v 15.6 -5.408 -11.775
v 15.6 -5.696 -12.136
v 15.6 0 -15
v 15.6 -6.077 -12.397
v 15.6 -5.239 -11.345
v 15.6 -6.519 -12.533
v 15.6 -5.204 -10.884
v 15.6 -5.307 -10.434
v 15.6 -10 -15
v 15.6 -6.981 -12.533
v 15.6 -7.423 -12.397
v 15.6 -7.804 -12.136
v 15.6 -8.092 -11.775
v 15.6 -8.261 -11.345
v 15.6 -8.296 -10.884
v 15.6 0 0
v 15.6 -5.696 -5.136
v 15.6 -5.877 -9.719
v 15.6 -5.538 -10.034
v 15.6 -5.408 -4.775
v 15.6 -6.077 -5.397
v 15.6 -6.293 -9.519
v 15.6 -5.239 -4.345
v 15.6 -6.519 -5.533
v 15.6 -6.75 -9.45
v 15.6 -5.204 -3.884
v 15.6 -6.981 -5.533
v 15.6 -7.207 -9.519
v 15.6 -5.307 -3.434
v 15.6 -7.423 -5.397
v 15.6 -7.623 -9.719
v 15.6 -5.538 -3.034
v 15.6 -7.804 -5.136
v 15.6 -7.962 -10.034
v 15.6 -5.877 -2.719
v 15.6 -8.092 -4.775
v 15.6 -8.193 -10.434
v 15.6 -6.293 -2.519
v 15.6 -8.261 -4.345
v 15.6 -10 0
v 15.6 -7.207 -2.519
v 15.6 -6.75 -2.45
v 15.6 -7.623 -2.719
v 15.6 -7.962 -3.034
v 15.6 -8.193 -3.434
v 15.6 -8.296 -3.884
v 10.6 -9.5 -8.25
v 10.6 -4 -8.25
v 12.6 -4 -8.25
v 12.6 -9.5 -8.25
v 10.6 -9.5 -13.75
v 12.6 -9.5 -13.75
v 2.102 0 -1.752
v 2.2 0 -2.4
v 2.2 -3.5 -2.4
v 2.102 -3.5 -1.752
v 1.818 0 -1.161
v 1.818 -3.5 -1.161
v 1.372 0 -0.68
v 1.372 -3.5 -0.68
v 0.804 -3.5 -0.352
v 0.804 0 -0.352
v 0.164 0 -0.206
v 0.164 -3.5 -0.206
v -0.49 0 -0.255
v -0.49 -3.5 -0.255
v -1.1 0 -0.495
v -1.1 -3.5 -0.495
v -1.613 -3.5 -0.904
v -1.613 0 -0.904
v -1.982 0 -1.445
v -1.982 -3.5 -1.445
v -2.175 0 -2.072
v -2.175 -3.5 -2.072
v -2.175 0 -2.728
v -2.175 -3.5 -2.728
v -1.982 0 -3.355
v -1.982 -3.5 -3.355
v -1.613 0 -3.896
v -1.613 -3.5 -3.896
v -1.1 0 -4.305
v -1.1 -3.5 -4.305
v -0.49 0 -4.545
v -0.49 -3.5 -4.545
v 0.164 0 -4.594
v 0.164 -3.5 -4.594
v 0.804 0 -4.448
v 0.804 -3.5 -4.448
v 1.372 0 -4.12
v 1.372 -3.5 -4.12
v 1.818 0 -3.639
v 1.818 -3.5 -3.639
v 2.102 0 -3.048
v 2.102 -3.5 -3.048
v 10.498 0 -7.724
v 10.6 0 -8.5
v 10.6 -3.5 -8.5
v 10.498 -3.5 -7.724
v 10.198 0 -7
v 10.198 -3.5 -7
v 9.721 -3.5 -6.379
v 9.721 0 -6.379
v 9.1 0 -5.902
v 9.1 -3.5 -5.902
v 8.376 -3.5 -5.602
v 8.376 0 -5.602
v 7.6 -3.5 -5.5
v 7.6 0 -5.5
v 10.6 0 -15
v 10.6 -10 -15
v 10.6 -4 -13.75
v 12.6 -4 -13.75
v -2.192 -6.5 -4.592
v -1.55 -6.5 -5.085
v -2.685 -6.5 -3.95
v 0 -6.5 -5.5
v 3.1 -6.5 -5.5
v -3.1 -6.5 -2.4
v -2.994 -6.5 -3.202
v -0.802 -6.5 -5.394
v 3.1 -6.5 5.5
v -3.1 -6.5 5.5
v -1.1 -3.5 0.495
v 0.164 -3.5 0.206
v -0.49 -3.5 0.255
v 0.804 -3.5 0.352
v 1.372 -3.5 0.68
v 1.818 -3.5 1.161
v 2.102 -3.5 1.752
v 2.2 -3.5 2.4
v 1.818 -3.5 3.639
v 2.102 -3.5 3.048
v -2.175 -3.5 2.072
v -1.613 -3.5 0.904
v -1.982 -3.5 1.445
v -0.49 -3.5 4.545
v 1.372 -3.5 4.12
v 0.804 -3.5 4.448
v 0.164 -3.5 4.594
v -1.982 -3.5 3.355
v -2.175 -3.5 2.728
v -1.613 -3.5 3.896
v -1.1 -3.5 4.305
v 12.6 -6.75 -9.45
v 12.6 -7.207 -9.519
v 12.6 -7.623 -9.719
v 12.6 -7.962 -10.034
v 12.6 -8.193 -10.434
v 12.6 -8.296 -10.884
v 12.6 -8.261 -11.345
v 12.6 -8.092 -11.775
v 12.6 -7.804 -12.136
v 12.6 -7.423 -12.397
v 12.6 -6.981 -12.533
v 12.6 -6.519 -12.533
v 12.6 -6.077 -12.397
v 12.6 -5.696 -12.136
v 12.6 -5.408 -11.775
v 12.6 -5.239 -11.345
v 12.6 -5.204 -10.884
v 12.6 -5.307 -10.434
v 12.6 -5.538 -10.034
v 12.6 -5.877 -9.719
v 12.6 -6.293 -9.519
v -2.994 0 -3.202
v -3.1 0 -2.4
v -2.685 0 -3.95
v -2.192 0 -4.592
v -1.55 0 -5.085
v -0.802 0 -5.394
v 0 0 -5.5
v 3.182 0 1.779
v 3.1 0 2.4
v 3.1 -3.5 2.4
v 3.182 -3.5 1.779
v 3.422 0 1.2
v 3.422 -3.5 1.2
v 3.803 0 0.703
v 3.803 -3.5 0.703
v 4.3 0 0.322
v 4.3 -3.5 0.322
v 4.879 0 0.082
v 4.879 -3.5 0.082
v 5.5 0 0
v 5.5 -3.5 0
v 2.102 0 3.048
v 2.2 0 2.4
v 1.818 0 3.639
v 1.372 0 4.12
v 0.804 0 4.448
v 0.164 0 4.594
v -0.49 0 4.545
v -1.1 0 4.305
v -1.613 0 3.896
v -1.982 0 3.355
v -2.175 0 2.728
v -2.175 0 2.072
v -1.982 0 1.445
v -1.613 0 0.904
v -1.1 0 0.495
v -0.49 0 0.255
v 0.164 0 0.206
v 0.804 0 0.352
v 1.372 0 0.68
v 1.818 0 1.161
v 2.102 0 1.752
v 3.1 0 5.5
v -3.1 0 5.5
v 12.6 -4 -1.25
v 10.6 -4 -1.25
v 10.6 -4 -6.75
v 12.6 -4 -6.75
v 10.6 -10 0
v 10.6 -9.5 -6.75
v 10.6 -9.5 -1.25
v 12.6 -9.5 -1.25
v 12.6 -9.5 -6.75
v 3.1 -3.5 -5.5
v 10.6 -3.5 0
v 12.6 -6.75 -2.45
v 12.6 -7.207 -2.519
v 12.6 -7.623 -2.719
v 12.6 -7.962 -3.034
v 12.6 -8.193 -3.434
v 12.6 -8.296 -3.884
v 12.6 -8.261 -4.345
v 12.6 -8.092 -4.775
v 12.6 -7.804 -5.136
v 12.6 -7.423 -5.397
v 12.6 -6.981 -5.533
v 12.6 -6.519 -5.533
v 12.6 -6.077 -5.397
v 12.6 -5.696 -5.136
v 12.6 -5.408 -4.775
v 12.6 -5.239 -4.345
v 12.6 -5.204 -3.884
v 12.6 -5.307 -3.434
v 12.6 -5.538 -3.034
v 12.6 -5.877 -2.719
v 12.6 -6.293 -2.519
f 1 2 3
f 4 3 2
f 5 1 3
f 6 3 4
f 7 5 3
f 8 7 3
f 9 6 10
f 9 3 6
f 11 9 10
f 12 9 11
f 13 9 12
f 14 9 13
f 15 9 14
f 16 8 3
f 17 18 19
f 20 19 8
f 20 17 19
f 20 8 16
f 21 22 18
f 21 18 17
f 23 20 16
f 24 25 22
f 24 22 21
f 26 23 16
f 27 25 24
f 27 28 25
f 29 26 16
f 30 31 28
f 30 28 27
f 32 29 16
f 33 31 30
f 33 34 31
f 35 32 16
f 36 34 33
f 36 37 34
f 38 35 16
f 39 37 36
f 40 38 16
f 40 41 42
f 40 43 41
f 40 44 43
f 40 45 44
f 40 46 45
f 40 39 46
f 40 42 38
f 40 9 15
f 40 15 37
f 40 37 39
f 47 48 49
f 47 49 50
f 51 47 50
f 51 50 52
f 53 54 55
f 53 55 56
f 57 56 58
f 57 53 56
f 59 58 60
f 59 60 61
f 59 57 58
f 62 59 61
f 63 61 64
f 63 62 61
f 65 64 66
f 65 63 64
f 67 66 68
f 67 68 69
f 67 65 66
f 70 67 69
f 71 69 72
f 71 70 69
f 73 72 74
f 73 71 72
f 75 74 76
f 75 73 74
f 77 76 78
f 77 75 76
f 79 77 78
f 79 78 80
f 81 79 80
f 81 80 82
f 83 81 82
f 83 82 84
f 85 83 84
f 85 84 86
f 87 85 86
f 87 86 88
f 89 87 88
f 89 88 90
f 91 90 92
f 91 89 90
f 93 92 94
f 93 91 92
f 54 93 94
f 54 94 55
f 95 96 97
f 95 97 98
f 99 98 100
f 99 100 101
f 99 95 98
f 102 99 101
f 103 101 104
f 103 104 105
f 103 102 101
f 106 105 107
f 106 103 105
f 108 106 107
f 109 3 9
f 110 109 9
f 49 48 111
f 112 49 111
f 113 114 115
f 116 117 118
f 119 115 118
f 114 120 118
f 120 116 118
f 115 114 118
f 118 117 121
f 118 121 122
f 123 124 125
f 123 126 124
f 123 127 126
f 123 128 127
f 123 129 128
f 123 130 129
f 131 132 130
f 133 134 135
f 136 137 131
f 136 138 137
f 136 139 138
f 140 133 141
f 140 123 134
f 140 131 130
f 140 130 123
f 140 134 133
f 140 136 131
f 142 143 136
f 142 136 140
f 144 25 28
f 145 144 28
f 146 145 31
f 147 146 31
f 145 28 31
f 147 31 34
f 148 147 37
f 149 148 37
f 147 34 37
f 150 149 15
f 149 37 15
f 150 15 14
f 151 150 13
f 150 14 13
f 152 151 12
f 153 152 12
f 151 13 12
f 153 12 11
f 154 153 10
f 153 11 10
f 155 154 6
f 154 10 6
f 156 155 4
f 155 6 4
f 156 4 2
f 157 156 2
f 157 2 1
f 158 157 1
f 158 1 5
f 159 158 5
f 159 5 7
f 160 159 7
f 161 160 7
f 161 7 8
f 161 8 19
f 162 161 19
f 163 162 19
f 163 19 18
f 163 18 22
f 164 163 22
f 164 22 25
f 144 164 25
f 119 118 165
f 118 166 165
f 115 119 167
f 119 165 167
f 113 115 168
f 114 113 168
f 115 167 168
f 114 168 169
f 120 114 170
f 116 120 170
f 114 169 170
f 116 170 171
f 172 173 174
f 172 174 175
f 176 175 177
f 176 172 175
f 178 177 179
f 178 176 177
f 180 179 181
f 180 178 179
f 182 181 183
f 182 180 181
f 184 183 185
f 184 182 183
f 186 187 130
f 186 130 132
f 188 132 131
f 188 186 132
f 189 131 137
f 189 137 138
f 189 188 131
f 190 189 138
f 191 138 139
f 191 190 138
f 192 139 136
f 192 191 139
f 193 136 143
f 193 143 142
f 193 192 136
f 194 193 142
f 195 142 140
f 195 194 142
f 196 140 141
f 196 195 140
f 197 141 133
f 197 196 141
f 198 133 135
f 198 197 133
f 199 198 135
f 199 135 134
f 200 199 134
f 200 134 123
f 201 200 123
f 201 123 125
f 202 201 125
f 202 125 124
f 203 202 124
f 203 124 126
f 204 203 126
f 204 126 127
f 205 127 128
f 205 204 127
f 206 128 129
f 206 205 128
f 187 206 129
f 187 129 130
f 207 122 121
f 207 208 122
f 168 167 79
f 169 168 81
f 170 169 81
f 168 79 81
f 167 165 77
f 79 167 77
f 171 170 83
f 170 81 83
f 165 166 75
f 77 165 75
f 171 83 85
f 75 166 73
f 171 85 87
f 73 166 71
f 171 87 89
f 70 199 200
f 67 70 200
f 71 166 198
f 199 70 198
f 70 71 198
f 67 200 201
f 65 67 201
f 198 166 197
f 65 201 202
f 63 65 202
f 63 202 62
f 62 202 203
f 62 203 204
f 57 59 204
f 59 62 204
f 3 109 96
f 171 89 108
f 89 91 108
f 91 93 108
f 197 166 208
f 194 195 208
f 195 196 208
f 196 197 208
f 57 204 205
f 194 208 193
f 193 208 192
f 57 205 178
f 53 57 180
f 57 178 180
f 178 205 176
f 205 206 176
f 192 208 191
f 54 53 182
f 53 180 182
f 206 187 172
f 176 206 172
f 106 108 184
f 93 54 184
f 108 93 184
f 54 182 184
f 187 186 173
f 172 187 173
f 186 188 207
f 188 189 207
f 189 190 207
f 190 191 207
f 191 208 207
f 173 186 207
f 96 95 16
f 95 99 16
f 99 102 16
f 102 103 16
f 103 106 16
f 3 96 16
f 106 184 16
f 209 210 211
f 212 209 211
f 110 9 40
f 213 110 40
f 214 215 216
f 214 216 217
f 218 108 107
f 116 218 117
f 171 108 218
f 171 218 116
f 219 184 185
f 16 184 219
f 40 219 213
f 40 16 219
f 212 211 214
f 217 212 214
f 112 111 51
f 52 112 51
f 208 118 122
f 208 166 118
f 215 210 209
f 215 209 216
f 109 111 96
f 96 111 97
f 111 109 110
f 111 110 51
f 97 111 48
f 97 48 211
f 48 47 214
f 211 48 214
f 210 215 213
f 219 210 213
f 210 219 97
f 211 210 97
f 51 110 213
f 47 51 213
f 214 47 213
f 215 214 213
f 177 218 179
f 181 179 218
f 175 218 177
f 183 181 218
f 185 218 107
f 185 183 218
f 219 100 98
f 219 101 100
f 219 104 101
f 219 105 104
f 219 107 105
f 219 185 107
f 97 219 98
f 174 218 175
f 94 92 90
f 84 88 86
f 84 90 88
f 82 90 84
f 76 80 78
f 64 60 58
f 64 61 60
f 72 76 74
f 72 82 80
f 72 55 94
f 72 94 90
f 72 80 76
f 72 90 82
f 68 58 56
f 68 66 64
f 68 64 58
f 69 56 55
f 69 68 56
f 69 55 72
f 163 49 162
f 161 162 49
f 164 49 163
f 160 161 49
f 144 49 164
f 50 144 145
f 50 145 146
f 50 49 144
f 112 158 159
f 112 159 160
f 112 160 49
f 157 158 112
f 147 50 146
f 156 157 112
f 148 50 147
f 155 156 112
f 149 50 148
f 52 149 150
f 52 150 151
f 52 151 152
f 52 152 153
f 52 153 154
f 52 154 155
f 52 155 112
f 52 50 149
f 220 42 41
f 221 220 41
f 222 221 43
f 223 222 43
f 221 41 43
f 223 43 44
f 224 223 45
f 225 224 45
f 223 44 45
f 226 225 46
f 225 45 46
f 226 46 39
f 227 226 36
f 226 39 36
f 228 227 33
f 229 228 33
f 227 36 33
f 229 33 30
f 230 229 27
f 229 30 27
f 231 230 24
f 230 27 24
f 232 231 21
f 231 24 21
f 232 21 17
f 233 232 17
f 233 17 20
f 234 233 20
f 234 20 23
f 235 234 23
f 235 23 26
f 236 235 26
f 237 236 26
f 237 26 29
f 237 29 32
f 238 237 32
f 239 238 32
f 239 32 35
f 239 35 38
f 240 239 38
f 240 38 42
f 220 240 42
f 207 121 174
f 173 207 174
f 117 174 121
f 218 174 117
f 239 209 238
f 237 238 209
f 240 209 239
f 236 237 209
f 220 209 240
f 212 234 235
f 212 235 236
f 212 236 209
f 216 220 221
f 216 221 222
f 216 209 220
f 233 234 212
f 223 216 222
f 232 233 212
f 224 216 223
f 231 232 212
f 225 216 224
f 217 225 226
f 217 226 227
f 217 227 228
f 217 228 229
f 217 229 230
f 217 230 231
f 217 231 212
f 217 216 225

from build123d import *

# Parameters (mm, degrees)
SKETCH_R     = 2.2
PAD_DEPTH    = 3.5
SKETCH001_W  = 15
SKETCH001_H  = 6.5
SKETCH001_R  = 1.55
PAD001_DEPTH = 5
SKETCH002_W  = 5.5
SKETCH002_H  = 5.5
POCKET_DEPTH = 2
PAD002_DEPTH = 3


with BuildPart() as part:
    # Sketch → Pad (new body)
    with BuildSketch(Plane.XZ):
        with BuildLine():
            Line((10.6, -8.5), (10.6, -15))
            Line((10.6, -15), (15.6, -15))
            Line((15.6, -15), (15.6, 0))
            Line((5.5, 0), (15.6, 0))
            ThreePointArc((3.1, 2.4), (3.802944, 0.702944), (5.5, 0))
            Line((3.1, 5.5), (3.1, 2.4))
            Line((-3.1, 5.5), (3.1, 5.5))
            Line((-3.1, -2.4), (-3.1, 5.5))
            ThreePointArc((-3.1, -2.4), (-2.192031, -4.592031), (0, -5.5))
            Line((7.6, -5.5), (0, -5.5))
            ThreePointArc((10.6, -8.5), (9.72132, -6.37868), (7.6, -5.5))
        make_face()
        with Locations((0, 2.4)):
            Circle(SKETCH_R, mode=Mode.SUBTRACT)
        with Locations((0, -2.4)):
            Circle(SKETCH_R, mode=Mode.SUBTRACT)
    extrude(amount=PAD_DEPTH)

    # Sketch001 (on Face4 of Pad) → Pad001 (join)
    with BuildSketch(Plane(origin=(15.6, 0, 0), x_dir=(0, 0, 1), z_dir=(1, 0, 0))):
        with Locations((-7.5, 6.75)):
            Rectangle(SKETCH001_W, SKETCH001_H)
        with Locations((-4, 6.75)):
            Circle(SKETCH001_R, mode=Mode.SUBTRACT)
        with Locations((-11, 6.75)):
            Circle(SKETCH001_R, mode=Mode.SUBTRACT)
    extrude(amount=-PAD001_DEPTH)

    # Sketch002 (on Face12 of Pad001) → Pocket (cut)
    with BuildSketch(Plane(origin=(10.6, 0, 0), x_dir=(0, 0, -1), z_dir=(-1, 0, 0))):
        with Locations((4, 6.75)):
            Rectangle(SKETCH002_W, SKETCH002_H)
        with Locations((11, 6.75)):
            Rectangle(SKETCH002_W, SKETCH002_H)
    extrude(amount=-POCKET_DEPTH, mode=Mode.SUBTRACT)

    # Sketch003 (on Face5 of Pocket) → Pad002 (join)
    with BuildSketch(Plane.XZ.offset(3.5)):
        with BuildLine():
            Line((-3.1, 5.5), (3.1, 5.5))
            Line((3.1, 5.5), (3.1, -5.5))
            Line((3.1, -5.5), (0, -5.5))
            ThreePointArc((-3.1, -2.4), (-2.192031, -4.592031), (0, -5.5))
            Line((-3.1, -2.4), (-3.1, 5.5))
        make_face()
    extrude(amount=PAD002_DEPTH)


solid = part.part
